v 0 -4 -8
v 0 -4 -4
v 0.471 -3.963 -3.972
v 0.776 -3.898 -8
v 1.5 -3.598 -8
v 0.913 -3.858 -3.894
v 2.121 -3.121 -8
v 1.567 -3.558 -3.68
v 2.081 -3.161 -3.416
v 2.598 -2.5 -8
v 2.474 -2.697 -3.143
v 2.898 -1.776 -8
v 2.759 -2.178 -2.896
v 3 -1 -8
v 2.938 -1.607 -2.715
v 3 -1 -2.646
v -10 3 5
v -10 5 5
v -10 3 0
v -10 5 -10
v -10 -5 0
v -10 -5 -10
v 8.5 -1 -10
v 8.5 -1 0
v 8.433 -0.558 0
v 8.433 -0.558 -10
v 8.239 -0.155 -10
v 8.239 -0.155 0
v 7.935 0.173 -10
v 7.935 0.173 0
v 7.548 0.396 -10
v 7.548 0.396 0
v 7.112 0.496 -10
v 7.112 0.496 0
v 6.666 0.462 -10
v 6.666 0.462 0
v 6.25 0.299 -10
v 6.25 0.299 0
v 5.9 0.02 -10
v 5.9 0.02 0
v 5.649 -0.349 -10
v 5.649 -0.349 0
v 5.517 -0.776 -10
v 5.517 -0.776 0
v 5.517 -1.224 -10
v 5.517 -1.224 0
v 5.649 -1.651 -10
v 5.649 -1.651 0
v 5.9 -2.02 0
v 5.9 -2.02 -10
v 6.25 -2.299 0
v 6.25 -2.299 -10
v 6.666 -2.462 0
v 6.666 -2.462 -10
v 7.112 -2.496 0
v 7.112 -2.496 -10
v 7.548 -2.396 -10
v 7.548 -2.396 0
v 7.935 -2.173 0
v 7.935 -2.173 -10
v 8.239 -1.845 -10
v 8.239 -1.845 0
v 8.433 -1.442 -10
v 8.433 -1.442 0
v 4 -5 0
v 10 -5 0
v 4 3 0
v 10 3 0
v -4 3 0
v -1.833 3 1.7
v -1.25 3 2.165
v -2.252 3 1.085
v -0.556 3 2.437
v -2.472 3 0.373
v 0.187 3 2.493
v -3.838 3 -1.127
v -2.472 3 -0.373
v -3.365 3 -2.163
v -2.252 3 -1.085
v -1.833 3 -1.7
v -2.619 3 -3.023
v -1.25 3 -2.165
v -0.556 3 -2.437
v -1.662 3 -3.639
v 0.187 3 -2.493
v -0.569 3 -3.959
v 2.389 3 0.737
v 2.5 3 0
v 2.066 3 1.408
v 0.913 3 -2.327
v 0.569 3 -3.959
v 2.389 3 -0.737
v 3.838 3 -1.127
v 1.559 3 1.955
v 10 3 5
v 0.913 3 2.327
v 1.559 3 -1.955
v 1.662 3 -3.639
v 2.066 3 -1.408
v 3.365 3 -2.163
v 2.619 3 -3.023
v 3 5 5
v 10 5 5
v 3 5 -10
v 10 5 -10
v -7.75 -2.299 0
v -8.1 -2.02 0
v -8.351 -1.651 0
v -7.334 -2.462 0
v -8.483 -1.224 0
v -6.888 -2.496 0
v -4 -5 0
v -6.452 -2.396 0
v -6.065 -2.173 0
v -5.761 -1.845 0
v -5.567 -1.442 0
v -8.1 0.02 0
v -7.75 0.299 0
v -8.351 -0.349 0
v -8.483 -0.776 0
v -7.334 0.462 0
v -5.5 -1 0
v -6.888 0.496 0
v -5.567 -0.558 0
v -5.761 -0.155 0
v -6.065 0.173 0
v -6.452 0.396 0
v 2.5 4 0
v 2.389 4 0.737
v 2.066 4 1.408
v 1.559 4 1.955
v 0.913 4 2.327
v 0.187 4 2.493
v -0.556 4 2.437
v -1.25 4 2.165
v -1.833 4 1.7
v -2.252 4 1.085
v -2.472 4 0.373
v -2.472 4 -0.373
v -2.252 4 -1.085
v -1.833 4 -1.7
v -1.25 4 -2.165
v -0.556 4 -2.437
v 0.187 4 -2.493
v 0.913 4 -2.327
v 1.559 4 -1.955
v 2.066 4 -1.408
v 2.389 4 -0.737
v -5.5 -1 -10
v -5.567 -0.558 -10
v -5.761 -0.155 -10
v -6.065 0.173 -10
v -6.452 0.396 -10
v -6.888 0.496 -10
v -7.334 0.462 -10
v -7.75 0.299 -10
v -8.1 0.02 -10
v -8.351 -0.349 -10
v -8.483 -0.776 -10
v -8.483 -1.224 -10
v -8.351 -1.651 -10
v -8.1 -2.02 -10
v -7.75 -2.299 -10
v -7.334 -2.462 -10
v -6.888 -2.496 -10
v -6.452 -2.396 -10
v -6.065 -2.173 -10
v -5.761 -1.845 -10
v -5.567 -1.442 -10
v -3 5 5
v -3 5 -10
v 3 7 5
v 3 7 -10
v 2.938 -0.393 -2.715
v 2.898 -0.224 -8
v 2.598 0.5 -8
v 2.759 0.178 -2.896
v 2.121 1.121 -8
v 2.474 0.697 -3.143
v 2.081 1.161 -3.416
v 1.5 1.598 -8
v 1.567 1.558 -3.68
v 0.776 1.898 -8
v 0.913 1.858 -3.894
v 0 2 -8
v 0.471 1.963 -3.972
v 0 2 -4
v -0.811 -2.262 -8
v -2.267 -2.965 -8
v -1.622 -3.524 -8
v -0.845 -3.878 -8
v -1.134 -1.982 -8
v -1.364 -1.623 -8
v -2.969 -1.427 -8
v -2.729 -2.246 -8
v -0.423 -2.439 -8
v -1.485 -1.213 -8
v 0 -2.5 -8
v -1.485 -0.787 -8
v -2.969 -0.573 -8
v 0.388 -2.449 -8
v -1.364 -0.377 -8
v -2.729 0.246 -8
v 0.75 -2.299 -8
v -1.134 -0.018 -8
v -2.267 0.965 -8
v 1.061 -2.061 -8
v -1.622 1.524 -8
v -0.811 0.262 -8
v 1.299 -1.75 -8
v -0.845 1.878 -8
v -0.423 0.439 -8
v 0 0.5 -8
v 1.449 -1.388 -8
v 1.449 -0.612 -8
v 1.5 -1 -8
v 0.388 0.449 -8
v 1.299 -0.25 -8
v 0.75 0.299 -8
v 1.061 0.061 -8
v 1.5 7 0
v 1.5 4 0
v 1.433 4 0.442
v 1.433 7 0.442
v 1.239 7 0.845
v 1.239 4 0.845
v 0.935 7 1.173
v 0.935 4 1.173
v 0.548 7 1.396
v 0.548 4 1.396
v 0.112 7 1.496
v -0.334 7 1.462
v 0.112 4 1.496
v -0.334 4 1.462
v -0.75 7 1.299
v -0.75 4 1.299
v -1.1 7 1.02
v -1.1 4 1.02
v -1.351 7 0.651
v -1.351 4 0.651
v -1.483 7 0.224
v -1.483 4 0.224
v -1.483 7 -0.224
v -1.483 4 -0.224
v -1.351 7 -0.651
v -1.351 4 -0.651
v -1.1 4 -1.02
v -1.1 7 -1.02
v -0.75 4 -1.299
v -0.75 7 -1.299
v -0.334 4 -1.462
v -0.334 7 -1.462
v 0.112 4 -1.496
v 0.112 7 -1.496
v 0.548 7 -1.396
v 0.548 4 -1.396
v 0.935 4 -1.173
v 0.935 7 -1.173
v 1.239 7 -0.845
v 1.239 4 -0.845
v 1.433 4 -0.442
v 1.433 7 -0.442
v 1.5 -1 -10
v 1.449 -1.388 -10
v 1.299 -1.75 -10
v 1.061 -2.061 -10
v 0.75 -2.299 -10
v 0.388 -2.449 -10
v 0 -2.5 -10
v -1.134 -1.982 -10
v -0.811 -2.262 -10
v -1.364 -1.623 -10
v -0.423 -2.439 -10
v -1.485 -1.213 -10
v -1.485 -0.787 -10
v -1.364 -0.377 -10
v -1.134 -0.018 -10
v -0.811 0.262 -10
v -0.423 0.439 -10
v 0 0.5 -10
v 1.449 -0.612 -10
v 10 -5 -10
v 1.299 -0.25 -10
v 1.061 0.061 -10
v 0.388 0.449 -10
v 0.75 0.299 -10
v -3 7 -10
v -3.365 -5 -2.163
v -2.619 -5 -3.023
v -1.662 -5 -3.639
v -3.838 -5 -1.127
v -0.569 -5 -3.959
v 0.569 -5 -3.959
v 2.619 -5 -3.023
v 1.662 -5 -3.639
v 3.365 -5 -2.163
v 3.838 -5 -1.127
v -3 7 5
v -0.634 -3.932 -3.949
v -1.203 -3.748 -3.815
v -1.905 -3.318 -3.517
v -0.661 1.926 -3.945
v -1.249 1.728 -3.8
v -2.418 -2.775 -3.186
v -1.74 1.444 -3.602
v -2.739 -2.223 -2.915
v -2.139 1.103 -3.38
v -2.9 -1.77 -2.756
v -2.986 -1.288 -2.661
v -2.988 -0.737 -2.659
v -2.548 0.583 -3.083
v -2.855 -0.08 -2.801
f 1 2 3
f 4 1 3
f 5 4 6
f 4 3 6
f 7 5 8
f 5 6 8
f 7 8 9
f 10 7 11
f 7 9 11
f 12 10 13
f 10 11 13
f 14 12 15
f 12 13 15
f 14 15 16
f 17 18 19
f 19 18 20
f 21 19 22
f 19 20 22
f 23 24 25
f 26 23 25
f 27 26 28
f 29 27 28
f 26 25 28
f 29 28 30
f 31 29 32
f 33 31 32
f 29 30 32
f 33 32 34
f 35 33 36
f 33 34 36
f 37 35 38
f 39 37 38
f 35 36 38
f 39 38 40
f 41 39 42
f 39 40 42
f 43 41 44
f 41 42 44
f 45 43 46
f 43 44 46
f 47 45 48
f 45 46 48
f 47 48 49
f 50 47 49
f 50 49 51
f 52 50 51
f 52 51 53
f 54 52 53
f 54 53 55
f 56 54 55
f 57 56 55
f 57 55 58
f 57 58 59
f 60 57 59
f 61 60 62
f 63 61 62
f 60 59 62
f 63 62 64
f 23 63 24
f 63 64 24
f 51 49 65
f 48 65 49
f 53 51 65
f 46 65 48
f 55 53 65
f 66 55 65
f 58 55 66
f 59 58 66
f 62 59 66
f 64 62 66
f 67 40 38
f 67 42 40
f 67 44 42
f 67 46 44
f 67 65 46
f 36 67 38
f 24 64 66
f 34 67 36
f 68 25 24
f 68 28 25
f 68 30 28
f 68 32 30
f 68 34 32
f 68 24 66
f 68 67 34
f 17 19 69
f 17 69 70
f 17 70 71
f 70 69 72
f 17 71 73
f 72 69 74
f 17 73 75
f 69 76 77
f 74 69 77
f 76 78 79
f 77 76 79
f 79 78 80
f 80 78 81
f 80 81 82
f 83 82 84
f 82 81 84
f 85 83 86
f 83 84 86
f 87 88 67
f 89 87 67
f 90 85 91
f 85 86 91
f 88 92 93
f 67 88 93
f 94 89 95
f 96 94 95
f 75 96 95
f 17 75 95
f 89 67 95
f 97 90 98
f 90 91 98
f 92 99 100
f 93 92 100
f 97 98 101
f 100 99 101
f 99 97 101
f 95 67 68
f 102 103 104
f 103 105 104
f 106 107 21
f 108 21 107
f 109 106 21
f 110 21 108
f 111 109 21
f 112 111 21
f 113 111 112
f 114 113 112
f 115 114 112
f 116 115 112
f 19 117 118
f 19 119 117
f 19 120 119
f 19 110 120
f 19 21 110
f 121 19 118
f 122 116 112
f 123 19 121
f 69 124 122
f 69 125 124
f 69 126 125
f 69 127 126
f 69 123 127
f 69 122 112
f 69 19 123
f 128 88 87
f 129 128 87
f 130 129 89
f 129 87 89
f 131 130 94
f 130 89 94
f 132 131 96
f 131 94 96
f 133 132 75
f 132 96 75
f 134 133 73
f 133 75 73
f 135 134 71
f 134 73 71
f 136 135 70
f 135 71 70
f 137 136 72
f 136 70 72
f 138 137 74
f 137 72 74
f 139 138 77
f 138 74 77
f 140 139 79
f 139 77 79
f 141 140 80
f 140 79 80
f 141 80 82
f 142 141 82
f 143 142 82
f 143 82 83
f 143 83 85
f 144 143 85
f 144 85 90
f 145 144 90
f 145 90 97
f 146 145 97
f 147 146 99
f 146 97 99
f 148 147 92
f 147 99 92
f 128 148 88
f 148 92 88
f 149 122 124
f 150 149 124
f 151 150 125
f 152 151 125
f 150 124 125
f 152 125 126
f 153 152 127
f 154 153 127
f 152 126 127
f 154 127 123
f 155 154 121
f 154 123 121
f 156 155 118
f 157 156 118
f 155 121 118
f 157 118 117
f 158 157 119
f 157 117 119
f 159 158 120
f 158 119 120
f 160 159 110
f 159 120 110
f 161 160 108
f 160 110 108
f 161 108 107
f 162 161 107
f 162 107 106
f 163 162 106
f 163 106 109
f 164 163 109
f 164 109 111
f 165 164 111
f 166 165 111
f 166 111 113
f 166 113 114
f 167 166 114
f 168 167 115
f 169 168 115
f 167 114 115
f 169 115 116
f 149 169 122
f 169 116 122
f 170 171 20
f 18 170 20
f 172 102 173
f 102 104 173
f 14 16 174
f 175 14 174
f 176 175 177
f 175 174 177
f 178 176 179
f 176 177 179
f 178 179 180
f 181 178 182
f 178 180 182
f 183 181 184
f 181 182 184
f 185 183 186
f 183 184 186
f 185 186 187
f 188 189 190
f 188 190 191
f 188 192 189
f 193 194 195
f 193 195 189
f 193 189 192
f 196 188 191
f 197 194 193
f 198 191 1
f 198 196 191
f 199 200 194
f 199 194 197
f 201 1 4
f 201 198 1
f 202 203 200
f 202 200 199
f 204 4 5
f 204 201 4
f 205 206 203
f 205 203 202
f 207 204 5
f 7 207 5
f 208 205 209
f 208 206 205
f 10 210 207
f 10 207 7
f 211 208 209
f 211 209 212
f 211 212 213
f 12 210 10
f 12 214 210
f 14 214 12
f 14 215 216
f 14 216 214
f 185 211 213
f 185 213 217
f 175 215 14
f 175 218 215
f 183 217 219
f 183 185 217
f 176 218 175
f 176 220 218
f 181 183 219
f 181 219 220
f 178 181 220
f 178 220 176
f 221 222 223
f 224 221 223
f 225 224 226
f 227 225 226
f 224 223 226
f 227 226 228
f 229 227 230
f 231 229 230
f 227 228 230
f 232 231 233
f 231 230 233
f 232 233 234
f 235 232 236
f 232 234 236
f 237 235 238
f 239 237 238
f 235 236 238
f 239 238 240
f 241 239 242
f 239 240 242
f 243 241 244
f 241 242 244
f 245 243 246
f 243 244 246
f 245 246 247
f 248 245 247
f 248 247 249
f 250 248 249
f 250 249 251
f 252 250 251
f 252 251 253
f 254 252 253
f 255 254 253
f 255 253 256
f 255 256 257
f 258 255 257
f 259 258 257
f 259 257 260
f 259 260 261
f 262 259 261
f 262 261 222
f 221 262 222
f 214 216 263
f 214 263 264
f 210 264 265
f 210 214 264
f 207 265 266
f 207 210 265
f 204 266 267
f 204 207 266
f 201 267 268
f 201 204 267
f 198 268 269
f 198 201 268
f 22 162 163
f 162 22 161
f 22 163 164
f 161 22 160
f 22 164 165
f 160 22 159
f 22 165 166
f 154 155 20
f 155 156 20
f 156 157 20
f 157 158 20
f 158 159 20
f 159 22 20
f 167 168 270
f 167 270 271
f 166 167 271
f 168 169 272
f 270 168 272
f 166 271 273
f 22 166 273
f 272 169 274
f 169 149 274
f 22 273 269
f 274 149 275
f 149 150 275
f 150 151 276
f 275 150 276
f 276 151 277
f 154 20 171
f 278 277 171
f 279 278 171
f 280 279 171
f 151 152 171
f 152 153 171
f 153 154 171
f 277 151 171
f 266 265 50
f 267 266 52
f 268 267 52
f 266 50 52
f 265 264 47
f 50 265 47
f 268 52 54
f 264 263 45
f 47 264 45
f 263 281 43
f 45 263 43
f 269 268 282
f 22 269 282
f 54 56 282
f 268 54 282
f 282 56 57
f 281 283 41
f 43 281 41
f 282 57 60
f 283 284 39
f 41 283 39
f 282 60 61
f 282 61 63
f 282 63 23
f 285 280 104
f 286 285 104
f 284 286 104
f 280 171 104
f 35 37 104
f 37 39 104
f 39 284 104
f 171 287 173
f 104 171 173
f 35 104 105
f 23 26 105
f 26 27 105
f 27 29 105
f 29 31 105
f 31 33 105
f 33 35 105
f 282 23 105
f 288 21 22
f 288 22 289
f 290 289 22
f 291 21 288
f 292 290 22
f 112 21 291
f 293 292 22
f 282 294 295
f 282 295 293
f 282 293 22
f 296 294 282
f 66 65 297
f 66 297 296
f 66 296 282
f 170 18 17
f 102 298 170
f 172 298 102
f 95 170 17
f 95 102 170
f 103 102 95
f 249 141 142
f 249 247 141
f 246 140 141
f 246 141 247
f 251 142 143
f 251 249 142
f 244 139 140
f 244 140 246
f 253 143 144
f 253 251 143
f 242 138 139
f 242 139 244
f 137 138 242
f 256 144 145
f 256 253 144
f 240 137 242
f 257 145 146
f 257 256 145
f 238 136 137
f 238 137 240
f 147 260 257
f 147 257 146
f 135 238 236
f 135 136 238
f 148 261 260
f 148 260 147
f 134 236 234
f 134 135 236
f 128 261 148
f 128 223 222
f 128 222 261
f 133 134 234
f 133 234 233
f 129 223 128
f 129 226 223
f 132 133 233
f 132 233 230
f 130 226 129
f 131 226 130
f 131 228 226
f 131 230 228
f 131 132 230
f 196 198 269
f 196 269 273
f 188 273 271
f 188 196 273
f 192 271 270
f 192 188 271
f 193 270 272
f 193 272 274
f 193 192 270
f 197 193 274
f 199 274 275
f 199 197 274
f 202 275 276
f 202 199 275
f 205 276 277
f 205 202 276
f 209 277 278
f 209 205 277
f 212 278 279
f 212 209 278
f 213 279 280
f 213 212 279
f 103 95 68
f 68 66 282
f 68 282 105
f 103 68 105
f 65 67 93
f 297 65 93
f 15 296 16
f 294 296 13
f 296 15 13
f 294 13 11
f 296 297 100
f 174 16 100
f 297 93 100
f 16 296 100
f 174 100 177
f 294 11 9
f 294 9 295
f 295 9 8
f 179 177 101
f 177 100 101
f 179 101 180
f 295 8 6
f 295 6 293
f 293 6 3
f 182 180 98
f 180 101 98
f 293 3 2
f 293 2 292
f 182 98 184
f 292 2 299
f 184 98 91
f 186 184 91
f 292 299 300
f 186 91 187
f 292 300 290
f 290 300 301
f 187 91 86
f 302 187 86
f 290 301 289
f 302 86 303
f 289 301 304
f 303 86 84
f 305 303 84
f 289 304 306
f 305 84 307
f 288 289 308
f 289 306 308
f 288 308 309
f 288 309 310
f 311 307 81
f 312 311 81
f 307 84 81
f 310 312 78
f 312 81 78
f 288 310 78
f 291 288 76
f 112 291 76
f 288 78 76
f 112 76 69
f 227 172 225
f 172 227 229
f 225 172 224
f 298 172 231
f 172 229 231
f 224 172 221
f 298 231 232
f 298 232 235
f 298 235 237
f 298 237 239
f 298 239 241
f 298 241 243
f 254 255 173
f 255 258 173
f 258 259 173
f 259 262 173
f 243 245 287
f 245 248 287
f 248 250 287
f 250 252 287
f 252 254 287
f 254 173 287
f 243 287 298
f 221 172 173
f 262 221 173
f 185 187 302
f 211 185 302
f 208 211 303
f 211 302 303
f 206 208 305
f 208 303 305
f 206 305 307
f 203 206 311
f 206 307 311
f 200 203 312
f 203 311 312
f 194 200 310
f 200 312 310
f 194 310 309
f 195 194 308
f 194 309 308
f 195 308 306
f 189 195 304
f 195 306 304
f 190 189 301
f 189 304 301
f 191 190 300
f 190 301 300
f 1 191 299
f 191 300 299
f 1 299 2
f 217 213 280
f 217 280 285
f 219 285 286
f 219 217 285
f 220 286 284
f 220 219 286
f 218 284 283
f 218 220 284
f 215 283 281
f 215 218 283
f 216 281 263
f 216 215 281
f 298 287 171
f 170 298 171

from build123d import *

# Parameters (mm, degrees)
F0_R     = 1.5
F1_DEPTH = 10
F3_DEPTH = 8
F5_DEPTH = 5
F6_R     = 1.5
F7_DEPTH = 4.001
F6_R_2   = 2.5
F8_DEPTH = 1


with BuildPart() as f1:
    # F0 (on Top) → F1 (new body)
    with BuildSketch(Plane.XY):
        with BuildLine():
            Line((10, -5), (10, 5))
            Line((10, 5), (3, 5))
            Line((3, 5), (3, 7))
            Line((3, 7), (-3, 7))
            Line((-3, 7), (-3, 5))
            Line((-3, 5), (-10, 5))
            Line((-10, 5), (-10, -5))
            Line((-10, -5), (0, -5))
            Line((0, -5), (0, -4))
            ThreePointArc((0, -4), (-3, -1), (0, 2))
            Line((0, 2), (0, 3))
            Line((0, 3), (4, 3))
            Line((4, 3), (4, -5))
            Line((4, -5), (10, -5))
        make_face()
        with Locations((-7, -1)):
            Circle(F0_R, mode=Mode.SUBTRACT)
        with Locations((7, -1)):
            Circle(F0_R, mode=Mode.SUBTRACT)
        with BuildLine():
            Line((0, -5), (4, -5))
            Line((4, -5), (4, 3))
            Line((4, 3), (0, 3))
            Line((0, 3), (0, 2))
            ThreePointArc((0, 2), (2.1213203436, 1.1213203436), (3, -1))
            ThreePointArc((3, -1), (2.1213203436, -3.1213203436), (0, -4))
            Line((0, -4), (0, -5))
        make_face()
        with BuildLine():
            Line((0, -2.5), (0, -4))
            ThreePointArc((0, -4), (2.1213203436, -3.1213203436), (3, -1))
            ThreePointArc((3, -1), (2.1213203436, 1.1213203436), (0, 2))
            Line((0, 2), (0, 0.5))
            ThreePointArc((0, 0.5), (1.0606601718, 0.0606601718), (1.5, -1))
            ThreePointArc((1.5, -1), (1.0606601718, -2.0606601718), (0, -2.5))
        make_face()
        with BuildLine():
            ThreePointArc((0, 2), (-3, -1), (0, -4))
            Line((0, -4), (0, -2.5))
            ThreePointArc((0, -2.5), (-1.5, -1), (0, 0.5))
            Line((0, 0.5), (0, 2))
        make_face()
    extrude(amount=-F1_DEPTH)

    # F0 (on Top) → F2 (revolve, cut)
    with BuildSketch(Plane.XY):
        with BuildLine():
            Line((0, -5), (4, -5))
            Line((4, -5), (4, 3))
            Line((4, 3), (0, 3))
            Line((0, 3), (0, 2))
            ThreePointArc((0, 2), (2.1213203436, 1.1213203436), (3, -1))
            ThreePointArc((3, -1), (2.1213203436, -3.1213203436), (0, -4))
            Line((0, -4), (0, -5))
        make_face()
        with BuildLine():
            Line((0, -2.5), (0, -4))
            ThreePointArc((0, -4), (2.1213203436, -3.1213203436), (3, -1))
            ThreePointArc((3, -1), (2.1213203436, 1.1213203436), (0, 2))
            Line((0, 2), (0, 0.5))
            ThreePointArc((0, 0.5), (1.0606601718, 0.0606601718), (1.5, -1))
            ThreePointArc((1.5, -1), (1.0606601718, -2.0606601718), (0, -2.5))
        make_face()
    revolve(axis=Axis((0, -1, 0), (0, 1, 0)), mode=Mode.SUBTRACT)

    # F0 (on Top) → F3 (cut)
    with BuildSketch(Plane.XY):
        with BuildLine():
            ThreePointArc((0, 2), (-3, -1), (0, -4))
            Line((0, -4), (0, -2.5))
            ThreePointArc((0, -2.5), (-1.5, -1), (0, 0.5))
            Line((0, 0.5), (0, 2))
        make_face()
        with BuildLine():
            Line((0, -2.5), (0, -4))
            ThreePointArc((0, -4), (2.1213203436, -3.1213203436), (3, -1))
            ThreePointArc((3, -1), (2.1213203436, 1.1213203436), (0, 2))
            Line((0, 2), (0, 0.5))
            ThreePointArc((0, 0.5), (1.0606601718, 0.0606601718), (1.5, -1))
            ThreePointArc((1.5, -1), (1.0606601718, -2.0606601718), (0, -2.5))
        make_face()
    extrude(amount=-F3_DEPTH, mode=Mode.SUBTRACT)

    # F4 (on face) → F5 (join)
    with BuildSketch(Plane.XY):
        Polygon((-10, 5), (-10, 3), (0, 3), (4, 3), (10, 3), (10, 5), (3, 5), (3, 7), (-3, 7), (-3, 5), align=None)
    extrude(amount=F5_DEPTH)

    # F6 (on face) → F7 (cut, through all)
    with BuildSketch(Plane.XZ.offset(-3)):
        Circle(F6_R)
    extrude(amount=-F7_DEPTH, mode=Mode.SUBTRACT)

    # F6 (on face) → F8 (cut)
    with BuildSketch(Plane.XZ.offset(-3)):
        Circle(F6_R_2)
        Circle(F6_R, mode=Mode.SUBTRACT)
    extrude(amount=-F8_DEPTH, mode=Mode.SUBTRACT)


solid = f1.part
